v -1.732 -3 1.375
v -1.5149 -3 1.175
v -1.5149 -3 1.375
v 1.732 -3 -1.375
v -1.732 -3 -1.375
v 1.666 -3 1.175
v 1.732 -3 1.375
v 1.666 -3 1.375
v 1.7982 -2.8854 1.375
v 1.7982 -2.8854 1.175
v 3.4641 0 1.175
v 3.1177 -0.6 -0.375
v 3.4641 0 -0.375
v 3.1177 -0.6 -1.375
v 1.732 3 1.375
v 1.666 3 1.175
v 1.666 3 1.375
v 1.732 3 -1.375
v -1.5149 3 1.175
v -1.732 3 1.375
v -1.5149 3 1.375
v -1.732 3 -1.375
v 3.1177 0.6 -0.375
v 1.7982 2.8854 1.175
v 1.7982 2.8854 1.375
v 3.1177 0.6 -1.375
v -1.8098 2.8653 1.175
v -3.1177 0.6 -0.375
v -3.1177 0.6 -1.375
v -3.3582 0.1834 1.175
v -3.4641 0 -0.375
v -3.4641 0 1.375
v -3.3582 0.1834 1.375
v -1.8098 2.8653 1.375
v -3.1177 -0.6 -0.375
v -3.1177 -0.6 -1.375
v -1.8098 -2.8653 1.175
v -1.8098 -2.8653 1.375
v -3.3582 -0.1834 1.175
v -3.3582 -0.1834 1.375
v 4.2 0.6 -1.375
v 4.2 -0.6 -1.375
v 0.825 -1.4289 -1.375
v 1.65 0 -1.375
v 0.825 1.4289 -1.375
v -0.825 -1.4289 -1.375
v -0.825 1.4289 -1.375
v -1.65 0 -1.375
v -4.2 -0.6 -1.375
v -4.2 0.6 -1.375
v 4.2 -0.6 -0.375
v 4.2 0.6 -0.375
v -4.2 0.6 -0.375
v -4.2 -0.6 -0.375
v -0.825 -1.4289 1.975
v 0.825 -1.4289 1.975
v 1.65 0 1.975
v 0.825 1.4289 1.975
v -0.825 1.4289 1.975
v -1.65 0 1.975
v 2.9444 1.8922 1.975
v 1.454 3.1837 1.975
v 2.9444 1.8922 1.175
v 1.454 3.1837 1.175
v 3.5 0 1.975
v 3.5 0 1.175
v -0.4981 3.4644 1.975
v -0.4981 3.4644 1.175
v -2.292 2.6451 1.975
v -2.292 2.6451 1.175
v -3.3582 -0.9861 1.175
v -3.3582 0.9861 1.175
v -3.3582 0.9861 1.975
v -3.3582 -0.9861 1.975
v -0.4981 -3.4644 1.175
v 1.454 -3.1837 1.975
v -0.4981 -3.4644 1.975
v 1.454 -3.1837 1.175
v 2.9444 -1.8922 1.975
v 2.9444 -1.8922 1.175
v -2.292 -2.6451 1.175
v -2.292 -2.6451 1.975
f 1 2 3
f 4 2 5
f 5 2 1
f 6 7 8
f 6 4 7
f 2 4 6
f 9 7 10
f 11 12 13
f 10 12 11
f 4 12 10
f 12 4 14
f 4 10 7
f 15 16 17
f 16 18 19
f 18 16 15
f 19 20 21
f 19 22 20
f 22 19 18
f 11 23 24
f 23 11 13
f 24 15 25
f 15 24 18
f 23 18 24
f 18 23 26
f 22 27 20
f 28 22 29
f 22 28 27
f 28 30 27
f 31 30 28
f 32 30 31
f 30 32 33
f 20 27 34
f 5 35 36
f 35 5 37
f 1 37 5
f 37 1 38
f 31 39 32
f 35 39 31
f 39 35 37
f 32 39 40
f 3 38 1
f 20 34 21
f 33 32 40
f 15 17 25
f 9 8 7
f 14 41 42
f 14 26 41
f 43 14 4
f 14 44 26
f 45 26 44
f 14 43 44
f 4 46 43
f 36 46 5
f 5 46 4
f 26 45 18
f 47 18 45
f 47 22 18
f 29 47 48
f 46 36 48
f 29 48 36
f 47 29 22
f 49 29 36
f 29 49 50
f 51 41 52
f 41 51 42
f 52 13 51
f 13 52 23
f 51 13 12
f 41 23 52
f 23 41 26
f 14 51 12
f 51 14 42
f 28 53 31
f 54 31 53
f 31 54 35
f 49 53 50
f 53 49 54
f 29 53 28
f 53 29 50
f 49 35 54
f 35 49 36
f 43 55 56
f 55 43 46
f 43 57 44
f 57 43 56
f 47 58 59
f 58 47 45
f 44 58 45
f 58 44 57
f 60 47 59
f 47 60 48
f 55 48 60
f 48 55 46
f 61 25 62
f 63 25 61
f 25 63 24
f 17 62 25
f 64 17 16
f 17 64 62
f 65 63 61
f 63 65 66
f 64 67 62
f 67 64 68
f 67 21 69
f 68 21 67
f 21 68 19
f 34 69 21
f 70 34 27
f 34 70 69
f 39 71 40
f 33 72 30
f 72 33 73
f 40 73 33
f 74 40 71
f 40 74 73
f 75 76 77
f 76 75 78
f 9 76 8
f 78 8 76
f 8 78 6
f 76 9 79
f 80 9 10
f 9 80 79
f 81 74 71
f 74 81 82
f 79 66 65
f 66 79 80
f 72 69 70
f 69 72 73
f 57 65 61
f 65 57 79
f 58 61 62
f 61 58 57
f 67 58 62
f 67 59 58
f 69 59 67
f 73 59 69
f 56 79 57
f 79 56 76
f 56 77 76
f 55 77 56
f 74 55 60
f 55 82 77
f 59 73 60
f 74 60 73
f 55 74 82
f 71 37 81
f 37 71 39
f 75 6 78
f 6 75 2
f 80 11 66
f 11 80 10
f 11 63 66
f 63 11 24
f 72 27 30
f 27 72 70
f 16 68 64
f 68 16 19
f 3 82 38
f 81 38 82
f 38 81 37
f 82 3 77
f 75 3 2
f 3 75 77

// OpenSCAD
// Parameters
screw_diameter = 3.0; //[1.5:6.0:0.1]
hole_clearance = 0.3; //[0.0:0.8:0.05]
across_flats = 6.0; //[3.0:12.0:0.1]
thickness = 2.75; //[1.4:5.5:0.05]
t_slot_channel_width = 8.0; //[4.0:16.0:0.1]
t_slot_channel_depth = 6.0; //[3.0:12.0:0.1]
t_slot_lip_opening = 6.2; //[3.0:12.0:0.1]
retention_wing_thickness = 1.2; //[0.6:2.4:0.05]
retention_wing_height = 1.0; //[0.5:2.0:0.05]
retention_wing_length = 1.2; //[0.6:2.4:0.05]
lead_in_chamfer = 0.6; //[0.2:1.5:0.05]
overlap = 0.8; //[0.2:2.0:0.1]
washer_outer_diameter = 7.0; //[4.0:14.0:0.1]
washer_thickness = 0.8; //[0.4:2.0:0.05]
nut_and_washer_gap = 0.6; //[0.0:3.0:0.1]

// Nut and Washer - complete geometry
module nut_and_washer() {
  color("DimGray") {
    // Hex body
    difference() {
      union() {
        // Hex profile
        translate([0, 0, 0])
          cylinder(r=across_flats/(2*cos(30)), h=thickness, center=true, $fn=6);
        
        // Retention wings
        translate([across_flats/2 + (retention_wing_length + overlap)/2 - overlap, 0, -thickness/2 + retention_wing_height/2])
          cube([retention_wing_length + overlap, retention_wing_thickness, retention_wing_height], center=true);
        translate([-(across_flats/2 + (retention_wing_length + overlap)/2 - overlap), 0, -thickness/2 + retention_wing_height/2])
          cube([retention_wing_length + overlap, retention_wing_thickness, retention_wing_height], center=true);
      }
      
      // Lead-in chamfers
      translate([across_flats/2 - lead_in_chamfer/2, across_flats/2 - lead_in_chamfer/2, 0])
        cube([lead_in_chamfer, lead_in_chamfer, thickness + 2*overlap], center=true);
      translate([-(across_flats/2 - lead_in_chamfer/2), across_flats/2 - lead_in_chamfer/2, 0])
        cube([lead_in_chamfer, lead_in_chamfer, thickness + 2*overlap], center=true);
      translate([across_flats/2 - lead_in_chamfer/2, -(across_flats/2 - lead_in_chamfer/2), 0])
        cube([lead_in_chamfer, lead_in_chamfer, thickness + 2*overlap], center=true);
      translate([-(across_flats/2 - lead_in_chamfer/2), -(across_flats/2 - lead_in_chamfer/2), 0])
        cube([lead_in_chamfer, lead_in_chamfer, thickness + 2*overlap], center=true);
      
      // Central screw hole
      translate([0, 0, 0])
        cylinder(r=(screw_diameter + hole_clearance)/2, h=thickness + 2*overlap, center=true);
    }
  }
  
  // Washer
  color("Silver") {
    difference() {
      translate([0, 0, thickness/2 + nut_and_washer_gap + washer_thickness/2 - overlap])
        cylinder(r=washer_outer_diameter/2, h=washer_thickness, center=true);
      translate([0, 0, thickness/2 + nut_and_washer_gap + washer_thickness/2 - overlap])
        cylinder(r=(screw_diameter + hole_clearance)/2, h=washer_thickness + 2*overlap, center=true);
    }
  }
}

// Assembly
module assembly() {
  nut_and_washer();
}

assembly();
